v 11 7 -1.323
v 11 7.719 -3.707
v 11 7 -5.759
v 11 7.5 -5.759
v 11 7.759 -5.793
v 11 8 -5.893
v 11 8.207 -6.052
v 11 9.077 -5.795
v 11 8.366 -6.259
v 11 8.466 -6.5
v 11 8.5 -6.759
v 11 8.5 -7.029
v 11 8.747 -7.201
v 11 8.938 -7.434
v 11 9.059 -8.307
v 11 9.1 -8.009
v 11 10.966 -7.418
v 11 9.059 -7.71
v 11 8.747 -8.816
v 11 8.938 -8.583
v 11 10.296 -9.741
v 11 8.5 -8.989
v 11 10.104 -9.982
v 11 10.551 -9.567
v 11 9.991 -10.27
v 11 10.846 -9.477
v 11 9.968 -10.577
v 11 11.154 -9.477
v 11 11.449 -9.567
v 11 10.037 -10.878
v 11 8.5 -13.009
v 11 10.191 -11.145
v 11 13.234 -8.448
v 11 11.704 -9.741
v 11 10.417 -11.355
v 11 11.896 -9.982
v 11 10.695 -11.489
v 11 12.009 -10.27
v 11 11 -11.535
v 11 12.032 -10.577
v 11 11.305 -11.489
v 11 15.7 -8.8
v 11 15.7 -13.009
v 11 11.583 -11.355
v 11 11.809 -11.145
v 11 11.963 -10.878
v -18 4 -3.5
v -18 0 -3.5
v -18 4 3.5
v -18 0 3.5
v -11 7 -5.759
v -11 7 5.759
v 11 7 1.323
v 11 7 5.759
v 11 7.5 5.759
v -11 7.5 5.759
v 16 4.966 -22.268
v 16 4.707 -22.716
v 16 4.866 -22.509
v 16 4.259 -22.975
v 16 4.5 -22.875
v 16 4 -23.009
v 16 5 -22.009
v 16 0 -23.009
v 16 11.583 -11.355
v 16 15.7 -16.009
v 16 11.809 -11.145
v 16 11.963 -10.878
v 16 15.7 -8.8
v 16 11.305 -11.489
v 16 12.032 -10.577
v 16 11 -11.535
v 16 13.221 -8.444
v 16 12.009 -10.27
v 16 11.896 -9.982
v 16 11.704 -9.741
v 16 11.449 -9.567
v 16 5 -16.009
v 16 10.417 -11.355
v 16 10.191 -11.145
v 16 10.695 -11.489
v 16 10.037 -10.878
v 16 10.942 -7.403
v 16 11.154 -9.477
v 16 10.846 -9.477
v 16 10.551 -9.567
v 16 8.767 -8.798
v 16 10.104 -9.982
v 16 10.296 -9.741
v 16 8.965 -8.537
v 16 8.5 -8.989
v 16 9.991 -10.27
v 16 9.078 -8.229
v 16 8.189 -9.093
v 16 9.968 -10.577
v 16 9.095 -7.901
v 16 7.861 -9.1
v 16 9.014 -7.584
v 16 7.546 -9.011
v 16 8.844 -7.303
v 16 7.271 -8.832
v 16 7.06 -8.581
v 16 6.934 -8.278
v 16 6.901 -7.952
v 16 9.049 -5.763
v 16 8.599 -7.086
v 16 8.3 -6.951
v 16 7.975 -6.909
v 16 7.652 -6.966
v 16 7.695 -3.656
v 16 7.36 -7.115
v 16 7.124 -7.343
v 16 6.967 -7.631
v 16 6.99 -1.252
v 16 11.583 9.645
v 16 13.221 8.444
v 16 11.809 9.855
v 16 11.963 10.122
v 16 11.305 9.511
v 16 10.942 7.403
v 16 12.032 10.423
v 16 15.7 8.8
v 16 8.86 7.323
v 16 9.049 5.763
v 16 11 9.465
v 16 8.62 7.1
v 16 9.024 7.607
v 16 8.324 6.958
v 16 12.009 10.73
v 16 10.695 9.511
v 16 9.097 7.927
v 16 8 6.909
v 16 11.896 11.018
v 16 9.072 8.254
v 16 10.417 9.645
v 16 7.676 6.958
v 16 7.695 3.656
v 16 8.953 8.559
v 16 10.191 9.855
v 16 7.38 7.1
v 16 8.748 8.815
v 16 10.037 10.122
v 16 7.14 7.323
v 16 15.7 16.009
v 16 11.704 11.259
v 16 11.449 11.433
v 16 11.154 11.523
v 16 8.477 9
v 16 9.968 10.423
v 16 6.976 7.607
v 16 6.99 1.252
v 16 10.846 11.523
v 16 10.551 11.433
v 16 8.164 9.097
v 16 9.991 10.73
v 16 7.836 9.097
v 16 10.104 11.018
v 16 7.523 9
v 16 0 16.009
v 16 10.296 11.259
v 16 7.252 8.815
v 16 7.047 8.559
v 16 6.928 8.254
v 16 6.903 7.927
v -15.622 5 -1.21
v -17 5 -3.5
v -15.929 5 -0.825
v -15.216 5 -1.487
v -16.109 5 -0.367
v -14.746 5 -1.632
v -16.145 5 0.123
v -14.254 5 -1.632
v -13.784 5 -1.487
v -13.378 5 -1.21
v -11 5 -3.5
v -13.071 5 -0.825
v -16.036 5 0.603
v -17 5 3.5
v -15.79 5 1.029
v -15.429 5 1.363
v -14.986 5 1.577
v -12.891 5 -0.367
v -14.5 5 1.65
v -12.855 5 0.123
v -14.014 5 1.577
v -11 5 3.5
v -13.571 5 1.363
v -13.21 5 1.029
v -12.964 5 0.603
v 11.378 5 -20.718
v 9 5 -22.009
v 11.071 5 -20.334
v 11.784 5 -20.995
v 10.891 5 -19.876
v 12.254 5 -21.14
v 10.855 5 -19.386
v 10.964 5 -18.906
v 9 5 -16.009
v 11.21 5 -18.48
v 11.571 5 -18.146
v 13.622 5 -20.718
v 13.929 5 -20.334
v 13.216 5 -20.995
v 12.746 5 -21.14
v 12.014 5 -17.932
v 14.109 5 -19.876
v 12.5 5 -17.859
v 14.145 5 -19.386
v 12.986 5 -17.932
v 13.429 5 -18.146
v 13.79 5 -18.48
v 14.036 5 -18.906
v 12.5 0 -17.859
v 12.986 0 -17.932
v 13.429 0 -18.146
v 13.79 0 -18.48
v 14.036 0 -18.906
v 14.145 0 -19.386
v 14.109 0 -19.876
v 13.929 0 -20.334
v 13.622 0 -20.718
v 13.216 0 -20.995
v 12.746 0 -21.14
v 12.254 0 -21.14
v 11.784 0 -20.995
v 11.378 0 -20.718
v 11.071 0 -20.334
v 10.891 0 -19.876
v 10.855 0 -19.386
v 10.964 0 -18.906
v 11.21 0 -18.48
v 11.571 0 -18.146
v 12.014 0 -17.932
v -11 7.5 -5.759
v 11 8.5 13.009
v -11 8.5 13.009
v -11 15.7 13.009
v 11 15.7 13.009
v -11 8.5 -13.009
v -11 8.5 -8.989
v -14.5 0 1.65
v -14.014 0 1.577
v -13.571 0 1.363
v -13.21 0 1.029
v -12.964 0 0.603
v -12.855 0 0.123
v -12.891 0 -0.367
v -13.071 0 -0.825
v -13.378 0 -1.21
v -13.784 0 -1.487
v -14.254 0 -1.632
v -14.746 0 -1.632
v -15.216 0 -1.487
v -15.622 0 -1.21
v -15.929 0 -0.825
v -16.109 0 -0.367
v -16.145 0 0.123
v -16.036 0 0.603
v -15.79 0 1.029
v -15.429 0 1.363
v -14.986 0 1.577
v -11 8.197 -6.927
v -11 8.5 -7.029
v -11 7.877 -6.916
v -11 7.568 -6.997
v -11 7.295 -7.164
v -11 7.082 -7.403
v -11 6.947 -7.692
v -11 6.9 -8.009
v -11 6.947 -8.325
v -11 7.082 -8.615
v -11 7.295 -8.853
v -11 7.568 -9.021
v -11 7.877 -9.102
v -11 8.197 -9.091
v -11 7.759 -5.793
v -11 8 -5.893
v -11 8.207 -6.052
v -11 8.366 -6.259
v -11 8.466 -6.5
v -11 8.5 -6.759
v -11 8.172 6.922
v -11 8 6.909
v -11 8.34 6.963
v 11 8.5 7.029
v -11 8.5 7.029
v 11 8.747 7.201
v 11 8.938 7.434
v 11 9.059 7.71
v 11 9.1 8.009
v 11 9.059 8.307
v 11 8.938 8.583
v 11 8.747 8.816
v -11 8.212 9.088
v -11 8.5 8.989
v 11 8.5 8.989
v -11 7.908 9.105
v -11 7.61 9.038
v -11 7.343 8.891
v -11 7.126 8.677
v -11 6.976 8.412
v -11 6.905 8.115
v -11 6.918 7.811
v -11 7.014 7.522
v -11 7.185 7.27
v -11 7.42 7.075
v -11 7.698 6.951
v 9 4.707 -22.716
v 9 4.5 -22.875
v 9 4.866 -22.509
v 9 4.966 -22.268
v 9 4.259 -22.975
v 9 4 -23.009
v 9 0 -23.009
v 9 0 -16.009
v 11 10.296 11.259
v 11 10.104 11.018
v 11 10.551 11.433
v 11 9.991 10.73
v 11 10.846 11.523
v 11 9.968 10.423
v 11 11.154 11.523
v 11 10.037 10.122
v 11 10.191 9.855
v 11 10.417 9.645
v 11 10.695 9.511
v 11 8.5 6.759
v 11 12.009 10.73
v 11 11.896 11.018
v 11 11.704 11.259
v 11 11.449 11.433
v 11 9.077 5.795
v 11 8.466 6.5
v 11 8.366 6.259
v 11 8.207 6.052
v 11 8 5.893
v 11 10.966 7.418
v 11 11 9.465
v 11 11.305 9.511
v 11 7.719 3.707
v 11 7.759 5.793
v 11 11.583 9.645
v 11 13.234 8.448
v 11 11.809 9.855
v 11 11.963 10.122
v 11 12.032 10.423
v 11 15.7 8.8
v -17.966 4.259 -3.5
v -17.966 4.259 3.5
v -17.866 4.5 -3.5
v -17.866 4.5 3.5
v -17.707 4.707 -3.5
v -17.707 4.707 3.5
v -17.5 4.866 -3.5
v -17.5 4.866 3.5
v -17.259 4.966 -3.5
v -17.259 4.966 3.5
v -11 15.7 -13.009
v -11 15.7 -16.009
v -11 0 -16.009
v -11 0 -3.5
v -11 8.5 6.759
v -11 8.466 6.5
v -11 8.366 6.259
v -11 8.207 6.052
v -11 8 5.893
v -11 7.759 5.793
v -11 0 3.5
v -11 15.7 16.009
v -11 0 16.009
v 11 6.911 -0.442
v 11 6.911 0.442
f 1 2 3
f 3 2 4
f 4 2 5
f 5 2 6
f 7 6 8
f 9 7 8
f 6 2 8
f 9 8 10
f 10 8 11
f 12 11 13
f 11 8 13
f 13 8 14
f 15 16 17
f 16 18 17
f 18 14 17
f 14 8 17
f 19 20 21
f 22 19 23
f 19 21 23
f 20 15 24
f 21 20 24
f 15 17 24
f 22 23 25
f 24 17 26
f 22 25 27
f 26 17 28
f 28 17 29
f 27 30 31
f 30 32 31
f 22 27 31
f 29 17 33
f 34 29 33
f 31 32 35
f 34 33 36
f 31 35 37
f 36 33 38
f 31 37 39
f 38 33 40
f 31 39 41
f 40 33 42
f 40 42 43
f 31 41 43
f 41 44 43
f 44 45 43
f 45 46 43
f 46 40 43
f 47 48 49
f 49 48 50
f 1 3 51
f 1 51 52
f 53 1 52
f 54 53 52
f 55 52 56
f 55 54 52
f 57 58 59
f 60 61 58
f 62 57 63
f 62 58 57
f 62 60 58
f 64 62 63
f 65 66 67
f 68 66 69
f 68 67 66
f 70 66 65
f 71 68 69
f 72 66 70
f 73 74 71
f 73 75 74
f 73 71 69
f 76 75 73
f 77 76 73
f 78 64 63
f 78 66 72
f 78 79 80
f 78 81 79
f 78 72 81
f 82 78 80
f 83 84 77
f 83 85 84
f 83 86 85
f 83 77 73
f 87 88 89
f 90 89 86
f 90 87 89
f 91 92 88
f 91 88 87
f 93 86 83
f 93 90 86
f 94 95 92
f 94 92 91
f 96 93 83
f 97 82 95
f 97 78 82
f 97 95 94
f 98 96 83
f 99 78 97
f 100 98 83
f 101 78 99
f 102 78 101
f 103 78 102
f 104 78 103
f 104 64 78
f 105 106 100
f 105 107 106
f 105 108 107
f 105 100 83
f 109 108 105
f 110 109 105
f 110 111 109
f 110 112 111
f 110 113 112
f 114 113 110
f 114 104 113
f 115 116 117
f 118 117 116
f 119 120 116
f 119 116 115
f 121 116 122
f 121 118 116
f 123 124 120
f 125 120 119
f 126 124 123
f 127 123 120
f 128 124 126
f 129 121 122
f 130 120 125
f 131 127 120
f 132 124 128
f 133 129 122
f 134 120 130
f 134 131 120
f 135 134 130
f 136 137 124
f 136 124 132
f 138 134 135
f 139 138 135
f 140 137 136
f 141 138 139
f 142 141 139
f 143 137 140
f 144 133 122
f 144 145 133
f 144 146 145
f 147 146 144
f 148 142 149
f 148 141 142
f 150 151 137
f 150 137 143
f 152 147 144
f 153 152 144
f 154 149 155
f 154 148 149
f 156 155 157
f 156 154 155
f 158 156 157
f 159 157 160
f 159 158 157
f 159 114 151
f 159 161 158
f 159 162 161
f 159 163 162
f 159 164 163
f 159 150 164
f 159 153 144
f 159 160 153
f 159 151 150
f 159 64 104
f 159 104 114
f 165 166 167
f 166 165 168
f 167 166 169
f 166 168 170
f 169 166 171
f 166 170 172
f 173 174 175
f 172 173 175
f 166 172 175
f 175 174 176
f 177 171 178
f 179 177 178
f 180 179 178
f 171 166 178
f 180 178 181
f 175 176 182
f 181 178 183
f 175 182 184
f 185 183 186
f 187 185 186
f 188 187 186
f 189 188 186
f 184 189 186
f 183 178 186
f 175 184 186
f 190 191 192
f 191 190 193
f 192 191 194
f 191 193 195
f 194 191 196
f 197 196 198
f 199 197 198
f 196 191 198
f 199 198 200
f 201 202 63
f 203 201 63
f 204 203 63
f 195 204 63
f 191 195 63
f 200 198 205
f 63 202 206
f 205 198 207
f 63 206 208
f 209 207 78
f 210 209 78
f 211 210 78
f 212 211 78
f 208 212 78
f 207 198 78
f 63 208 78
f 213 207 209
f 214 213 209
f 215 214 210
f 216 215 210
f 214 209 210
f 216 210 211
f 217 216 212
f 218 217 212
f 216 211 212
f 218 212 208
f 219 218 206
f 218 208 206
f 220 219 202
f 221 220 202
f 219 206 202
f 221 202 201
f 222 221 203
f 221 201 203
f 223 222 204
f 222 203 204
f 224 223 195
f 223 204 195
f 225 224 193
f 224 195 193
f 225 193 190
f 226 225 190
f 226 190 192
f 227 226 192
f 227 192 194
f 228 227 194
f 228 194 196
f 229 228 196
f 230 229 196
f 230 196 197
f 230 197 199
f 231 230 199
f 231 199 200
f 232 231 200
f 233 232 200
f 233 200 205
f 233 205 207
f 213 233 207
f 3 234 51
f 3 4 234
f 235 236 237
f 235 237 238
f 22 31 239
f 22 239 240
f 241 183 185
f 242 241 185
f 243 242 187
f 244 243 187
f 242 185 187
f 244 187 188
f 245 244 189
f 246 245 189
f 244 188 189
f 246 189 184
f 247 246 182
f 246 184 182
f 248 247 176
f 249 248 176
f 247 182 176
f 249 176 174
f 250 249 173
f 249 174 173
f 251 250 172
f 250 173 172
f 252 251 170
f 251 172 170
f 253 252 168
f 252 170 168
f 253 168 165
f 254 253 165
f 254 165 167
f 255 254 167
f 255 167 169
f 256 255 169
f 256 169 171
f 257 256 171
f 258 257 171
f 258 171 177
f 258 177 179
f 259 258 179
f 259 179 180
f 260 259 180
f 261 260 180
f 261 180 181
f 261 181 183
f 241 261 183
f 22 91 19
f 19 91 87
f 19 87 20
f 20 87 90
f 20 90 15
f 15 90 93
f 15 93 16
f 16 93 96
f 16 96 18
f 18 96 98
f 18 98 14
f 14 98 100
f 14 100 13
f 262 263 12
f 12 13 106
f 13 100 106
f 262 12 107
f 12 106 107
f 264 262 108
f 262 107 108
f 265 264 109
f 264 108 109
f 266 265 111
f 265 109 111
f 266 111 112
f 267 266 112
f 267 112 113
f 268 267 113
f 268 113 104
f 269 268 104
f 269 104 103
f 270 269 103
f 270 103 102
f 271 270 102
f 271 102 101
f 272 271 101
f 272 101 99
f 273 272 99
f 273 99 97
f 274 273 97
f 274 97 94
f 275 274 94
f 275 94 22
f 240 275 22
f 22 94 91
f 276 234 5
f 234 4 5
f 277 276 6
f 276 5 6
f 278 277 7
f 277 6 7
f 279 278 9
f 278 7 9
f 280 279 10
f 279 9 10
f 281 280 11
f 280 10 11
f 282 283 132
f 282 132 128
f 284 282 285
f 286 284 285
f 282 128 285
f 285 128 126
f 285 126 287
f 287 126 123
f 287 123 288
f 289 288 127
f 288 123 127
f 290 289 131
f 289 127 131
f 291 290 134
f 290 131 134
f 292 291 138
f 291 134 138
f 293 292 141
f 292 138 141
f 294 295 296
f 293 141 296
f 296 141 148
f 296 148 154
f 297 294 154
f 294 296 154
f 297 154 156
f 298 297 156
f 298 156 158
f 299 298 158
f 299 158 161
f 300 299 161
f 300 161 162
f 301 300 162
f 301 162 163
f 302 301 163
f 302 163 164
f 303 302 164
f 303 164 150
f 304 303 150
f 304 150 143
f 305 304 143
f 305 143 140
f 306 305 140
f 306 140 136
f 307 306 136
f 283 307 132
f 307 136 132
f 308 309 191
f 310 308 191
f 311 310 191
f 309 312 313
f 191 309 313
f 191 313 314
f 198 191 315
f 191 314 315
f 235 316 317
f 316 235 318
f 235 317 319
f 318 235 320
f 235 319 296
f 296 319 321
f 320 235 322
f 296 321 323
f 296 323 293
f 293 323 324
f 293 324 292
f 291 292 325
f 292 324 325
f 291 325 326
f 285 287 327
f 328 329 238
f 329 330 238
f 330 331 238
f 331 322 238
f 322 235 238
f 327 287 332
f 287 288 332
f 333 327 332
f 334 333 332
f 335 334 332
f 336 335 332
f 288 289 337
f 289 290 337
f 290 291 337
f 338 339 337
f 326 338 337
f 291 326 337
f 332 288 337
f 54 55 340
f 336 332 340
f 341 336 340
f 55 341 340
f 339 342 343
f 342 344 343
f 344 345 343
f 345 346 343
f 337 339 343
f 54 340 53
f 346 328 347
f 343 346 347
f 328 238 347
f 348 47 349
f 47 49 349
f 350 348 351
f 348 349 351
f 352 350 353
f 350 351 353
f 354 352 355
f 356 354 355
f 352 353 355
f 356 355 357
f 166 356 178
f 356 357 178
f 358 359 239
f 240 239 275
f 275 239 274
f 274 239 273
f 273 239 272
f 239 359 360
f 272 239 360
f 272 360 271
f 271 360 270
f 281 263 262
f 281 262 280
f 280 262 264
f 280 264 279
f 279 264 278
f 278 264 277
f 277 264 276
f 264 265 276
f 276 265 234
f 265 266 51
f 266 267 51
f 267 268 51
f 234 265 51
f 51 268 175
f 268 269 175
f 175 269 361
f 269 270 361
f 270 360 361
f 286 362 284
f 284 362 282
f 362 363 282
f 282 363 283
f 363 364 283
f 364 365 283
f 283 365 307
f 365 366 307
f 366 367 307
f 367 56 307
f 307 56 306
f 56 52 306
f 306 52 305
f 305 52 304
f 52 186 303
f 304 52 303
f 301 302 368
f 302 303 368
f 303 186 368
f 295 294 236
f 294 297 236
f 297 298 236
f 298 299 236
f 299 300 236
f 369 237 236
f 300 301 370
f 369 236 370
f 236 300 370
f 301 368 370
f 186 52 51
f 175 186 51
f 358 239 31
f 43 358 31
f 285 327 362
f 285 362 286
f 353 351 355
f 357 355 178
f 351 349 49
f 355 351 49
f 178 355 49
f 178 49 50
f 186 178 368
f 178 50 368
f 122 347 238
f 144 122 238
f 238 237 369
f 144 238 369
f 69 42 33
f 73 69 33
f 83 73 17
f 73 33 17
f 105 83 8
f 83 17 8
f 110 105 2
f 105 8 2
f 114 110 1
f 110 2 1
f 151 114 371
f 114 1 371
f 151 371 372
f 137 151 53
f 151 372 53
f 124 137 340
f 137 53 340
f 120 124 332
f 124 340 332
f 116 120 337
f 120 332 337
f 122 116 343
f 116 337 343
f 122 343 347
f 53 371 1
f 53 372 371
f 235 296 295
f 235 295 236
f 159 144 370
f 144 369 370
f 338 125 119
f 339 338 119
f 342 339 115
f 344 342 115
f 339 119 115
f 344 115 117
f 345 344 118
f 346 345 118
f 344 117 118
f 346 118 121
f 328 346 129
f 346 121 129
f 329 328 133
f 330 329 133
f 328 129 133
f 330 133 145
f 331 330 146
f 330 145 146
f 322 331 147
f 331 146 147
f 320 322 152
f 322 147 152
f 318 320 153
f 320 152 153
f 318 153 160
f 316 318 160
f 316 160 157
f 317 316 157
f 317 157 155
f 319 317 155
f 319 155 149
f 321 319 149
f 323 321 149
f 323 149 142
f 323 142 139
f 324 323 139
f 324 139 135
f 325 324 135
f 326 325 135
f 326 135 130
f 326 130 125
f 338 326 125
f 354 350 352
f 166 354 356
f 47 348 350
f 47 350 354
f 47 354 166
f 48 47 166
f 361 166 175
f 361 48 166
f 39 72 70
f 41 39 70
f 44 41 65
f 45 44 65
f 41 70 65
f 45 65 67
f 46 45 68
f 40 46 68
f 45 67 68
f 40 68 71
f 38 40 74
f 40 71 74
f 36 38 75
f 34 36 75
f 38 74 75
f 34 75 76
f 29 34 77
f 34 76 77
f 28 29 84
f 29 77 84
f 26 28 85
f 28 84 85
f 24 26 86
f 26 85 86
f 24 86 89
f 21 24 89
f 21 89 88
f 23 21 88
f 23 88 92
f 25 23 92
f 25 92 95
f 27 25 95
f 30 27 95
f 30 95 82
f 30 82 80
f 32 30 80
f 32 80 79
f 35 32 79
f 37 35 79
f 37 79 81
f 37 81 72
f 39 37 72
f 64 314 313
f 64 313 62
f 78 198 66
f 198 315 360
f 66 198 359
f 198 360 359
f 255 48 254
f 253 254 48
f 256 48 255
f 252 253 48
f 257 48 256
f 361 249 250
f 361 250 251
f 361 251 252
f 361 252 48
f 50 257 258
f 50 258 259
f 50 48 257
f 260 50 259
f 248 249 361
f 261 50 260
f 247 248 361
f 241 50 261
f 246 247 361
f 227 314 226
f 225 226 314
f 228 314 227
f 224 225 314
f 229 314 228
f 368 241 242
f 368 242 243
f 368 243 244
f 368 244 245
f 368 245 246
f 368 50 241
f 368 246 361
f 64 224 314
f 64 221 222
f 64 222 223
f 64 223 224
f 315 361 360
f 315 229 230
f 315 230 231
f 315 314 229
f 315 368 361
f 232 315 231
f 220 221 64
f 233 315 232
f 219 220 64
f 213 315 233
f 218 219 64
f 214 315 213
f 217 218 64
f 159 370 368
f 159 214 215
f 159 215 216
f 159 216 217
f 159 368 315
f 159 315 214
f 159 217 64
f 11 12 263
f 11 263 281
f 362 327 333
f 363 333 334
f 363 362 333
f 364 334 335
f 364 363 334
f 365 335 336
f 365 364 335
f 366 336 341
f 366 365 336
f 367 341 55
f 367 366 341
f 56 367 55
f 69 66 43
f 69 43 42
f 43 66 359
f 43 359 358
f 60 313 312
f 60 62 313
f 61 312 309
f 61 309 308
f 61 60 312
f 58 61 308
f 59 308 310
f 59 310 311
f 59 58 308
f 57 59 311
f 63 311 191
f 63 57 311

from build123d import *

# Parameters (mm, degrees)
BOSS_EXTRUDE1_DEPTH = 11
SKETCH3_W           = 22
SKETCH3_H           = 3
BOSS_EXTRUDE2_DEPTH = 15.7
BOSS_EXTRUDE3_DEPTH = 5
SKETCH5_R           = 1.035
SKETCH5_R_2         = 1.1
CUT_EXTRUDE1_DEPTH  = 36.096650541
SKETCH6_W           = 7
SKETCH6_H           = 7
BOSS_EXTRUDE4_DEPTH = 5
SKETCH7_R           = 1.65
CUT_EXTRUDE2_DEPTH  = 32.1110829
FILLET1_R           = 1


with BuildPart() as part:
    # Sketch1 → Boss-Extrude1 (new, symmetric)
    with BuildSketch(Plane(origin=(0, 0, 0), x_dir=(0, 0, -1), z_dir=(1, 0, 0))):
        Polygon((-13.0089, 0), (13.0089, 0), (13.0089, 8.5), (5.7589, 8.5), (5.7589, 7), (-5.7589, 7), (-5.7589, 8.5), (-13.0089, 8.5), align=None)
    extrude(amount=BOSS_EXTRUDE1_DEPTH, both=True)

    # Sketch3 → Boss-Extrude2 (add)
    with BuildSketch(Plane.XZ):
        with Locations((0, -14.5089)):
            Rectangle(SKETCH3_W, SKETCH3_H)
        with Locations((0, 14.5089)):
            Rectangle(SKETCH3_W, SKETCH3_H)
    extrude(amount=-BOSS_EXTRUDE2_DEPTH)

    # Sketch4 → Boss-Extrude3 (add)
    with BuildSketch(Plane(origin=(11, 0, 0), x_dir=(0, 0, -1), z_dir=(1, 0, 0))):
        with BuildLine():
            Line((-8.8, 15.7), (-16.0089, 15.7))
            Line((-16.0089, 15.7), (-16.0089, 0))
            Line((-16.0089, 0), (16.0089, 0))
            Line((16.0089, 0), (16.0089, 15.7))
            Line((16.0089, 15.7), (8.8, 15.7))
            ThreePointArc((8.8, 15.7), (0, 6.9), (-8.8, 15.7))
        make_face()
    extrude(amount=BOSS_EXTRUDE3_DEPTH)

    # Sketch5 → Cut-Extrude1 (cut, through all)
    with BuildSketch(Plane(origin=(16, 0, 0), x_dir=(0, 0, -1), z_dir=(1, 0, 0))):
        with Locations((-10.5, 11)):
            Circle(SKETCH5_R)
        with Locations((10.5, 11)):
            Circle(SKETCH5_R)
        with Locations((-8.0089, 8)):
            Circle(SKETCH5_R_2)
        with Locations(Location((8.0089, 8, 0), (0, 0, 27.035691789))):
            Circle(SKETCH5_R_2)
    extrude(amount=-CUT_EXTRUDE1_DEPTH, mode=Mode.SUBTRACT)

    # Sketch6 → Boss-Extrude4 (add)
    with BuildSketch(Plane.XZ):
        with Locations((12.5, -19.5089)):
            Rectangle(SKETCH6_W, SKETCH6_H)
        with Locations((-14.5, 0)):
            Rectangle(SKETCH6_W, SKETCH6_H)
    extrude(amount=-BOSS_EXTRUDE4_DEPTH)

    # Sketch7 → Cut-Extrude2 (cut, through all)
    with BuildSketch(Plane(origin=(0, 5, 0), x_dir=(1, 0, 0), z_dir=(0, 1, 0))):
        with Locations(Location((-14.5, 0, 0), (0, 0, 270))):
            Circle(SKETCH7_R)
        with Locations(Location((12.5, 19.5089, 0), (0, 0, 270))):
            Circle(SKETCH7_R)
    extrude(amount=-CUT_EXTRUDE2_DEPTH, mode=Mode.SUBTRACT)

    # Fillet1
    fillet1_edges = [part.edges().sort_by_distance(p)[0] for p in [
        (-18, 5, 0),
        (12.5, 5, -23.0089),
        (0, 8.5, 5.7589),
        (0, 8.5, -5.7589),
    ]]
    fillet(fillet1_edges, radius=FILLET1_R)


solid = part.part
